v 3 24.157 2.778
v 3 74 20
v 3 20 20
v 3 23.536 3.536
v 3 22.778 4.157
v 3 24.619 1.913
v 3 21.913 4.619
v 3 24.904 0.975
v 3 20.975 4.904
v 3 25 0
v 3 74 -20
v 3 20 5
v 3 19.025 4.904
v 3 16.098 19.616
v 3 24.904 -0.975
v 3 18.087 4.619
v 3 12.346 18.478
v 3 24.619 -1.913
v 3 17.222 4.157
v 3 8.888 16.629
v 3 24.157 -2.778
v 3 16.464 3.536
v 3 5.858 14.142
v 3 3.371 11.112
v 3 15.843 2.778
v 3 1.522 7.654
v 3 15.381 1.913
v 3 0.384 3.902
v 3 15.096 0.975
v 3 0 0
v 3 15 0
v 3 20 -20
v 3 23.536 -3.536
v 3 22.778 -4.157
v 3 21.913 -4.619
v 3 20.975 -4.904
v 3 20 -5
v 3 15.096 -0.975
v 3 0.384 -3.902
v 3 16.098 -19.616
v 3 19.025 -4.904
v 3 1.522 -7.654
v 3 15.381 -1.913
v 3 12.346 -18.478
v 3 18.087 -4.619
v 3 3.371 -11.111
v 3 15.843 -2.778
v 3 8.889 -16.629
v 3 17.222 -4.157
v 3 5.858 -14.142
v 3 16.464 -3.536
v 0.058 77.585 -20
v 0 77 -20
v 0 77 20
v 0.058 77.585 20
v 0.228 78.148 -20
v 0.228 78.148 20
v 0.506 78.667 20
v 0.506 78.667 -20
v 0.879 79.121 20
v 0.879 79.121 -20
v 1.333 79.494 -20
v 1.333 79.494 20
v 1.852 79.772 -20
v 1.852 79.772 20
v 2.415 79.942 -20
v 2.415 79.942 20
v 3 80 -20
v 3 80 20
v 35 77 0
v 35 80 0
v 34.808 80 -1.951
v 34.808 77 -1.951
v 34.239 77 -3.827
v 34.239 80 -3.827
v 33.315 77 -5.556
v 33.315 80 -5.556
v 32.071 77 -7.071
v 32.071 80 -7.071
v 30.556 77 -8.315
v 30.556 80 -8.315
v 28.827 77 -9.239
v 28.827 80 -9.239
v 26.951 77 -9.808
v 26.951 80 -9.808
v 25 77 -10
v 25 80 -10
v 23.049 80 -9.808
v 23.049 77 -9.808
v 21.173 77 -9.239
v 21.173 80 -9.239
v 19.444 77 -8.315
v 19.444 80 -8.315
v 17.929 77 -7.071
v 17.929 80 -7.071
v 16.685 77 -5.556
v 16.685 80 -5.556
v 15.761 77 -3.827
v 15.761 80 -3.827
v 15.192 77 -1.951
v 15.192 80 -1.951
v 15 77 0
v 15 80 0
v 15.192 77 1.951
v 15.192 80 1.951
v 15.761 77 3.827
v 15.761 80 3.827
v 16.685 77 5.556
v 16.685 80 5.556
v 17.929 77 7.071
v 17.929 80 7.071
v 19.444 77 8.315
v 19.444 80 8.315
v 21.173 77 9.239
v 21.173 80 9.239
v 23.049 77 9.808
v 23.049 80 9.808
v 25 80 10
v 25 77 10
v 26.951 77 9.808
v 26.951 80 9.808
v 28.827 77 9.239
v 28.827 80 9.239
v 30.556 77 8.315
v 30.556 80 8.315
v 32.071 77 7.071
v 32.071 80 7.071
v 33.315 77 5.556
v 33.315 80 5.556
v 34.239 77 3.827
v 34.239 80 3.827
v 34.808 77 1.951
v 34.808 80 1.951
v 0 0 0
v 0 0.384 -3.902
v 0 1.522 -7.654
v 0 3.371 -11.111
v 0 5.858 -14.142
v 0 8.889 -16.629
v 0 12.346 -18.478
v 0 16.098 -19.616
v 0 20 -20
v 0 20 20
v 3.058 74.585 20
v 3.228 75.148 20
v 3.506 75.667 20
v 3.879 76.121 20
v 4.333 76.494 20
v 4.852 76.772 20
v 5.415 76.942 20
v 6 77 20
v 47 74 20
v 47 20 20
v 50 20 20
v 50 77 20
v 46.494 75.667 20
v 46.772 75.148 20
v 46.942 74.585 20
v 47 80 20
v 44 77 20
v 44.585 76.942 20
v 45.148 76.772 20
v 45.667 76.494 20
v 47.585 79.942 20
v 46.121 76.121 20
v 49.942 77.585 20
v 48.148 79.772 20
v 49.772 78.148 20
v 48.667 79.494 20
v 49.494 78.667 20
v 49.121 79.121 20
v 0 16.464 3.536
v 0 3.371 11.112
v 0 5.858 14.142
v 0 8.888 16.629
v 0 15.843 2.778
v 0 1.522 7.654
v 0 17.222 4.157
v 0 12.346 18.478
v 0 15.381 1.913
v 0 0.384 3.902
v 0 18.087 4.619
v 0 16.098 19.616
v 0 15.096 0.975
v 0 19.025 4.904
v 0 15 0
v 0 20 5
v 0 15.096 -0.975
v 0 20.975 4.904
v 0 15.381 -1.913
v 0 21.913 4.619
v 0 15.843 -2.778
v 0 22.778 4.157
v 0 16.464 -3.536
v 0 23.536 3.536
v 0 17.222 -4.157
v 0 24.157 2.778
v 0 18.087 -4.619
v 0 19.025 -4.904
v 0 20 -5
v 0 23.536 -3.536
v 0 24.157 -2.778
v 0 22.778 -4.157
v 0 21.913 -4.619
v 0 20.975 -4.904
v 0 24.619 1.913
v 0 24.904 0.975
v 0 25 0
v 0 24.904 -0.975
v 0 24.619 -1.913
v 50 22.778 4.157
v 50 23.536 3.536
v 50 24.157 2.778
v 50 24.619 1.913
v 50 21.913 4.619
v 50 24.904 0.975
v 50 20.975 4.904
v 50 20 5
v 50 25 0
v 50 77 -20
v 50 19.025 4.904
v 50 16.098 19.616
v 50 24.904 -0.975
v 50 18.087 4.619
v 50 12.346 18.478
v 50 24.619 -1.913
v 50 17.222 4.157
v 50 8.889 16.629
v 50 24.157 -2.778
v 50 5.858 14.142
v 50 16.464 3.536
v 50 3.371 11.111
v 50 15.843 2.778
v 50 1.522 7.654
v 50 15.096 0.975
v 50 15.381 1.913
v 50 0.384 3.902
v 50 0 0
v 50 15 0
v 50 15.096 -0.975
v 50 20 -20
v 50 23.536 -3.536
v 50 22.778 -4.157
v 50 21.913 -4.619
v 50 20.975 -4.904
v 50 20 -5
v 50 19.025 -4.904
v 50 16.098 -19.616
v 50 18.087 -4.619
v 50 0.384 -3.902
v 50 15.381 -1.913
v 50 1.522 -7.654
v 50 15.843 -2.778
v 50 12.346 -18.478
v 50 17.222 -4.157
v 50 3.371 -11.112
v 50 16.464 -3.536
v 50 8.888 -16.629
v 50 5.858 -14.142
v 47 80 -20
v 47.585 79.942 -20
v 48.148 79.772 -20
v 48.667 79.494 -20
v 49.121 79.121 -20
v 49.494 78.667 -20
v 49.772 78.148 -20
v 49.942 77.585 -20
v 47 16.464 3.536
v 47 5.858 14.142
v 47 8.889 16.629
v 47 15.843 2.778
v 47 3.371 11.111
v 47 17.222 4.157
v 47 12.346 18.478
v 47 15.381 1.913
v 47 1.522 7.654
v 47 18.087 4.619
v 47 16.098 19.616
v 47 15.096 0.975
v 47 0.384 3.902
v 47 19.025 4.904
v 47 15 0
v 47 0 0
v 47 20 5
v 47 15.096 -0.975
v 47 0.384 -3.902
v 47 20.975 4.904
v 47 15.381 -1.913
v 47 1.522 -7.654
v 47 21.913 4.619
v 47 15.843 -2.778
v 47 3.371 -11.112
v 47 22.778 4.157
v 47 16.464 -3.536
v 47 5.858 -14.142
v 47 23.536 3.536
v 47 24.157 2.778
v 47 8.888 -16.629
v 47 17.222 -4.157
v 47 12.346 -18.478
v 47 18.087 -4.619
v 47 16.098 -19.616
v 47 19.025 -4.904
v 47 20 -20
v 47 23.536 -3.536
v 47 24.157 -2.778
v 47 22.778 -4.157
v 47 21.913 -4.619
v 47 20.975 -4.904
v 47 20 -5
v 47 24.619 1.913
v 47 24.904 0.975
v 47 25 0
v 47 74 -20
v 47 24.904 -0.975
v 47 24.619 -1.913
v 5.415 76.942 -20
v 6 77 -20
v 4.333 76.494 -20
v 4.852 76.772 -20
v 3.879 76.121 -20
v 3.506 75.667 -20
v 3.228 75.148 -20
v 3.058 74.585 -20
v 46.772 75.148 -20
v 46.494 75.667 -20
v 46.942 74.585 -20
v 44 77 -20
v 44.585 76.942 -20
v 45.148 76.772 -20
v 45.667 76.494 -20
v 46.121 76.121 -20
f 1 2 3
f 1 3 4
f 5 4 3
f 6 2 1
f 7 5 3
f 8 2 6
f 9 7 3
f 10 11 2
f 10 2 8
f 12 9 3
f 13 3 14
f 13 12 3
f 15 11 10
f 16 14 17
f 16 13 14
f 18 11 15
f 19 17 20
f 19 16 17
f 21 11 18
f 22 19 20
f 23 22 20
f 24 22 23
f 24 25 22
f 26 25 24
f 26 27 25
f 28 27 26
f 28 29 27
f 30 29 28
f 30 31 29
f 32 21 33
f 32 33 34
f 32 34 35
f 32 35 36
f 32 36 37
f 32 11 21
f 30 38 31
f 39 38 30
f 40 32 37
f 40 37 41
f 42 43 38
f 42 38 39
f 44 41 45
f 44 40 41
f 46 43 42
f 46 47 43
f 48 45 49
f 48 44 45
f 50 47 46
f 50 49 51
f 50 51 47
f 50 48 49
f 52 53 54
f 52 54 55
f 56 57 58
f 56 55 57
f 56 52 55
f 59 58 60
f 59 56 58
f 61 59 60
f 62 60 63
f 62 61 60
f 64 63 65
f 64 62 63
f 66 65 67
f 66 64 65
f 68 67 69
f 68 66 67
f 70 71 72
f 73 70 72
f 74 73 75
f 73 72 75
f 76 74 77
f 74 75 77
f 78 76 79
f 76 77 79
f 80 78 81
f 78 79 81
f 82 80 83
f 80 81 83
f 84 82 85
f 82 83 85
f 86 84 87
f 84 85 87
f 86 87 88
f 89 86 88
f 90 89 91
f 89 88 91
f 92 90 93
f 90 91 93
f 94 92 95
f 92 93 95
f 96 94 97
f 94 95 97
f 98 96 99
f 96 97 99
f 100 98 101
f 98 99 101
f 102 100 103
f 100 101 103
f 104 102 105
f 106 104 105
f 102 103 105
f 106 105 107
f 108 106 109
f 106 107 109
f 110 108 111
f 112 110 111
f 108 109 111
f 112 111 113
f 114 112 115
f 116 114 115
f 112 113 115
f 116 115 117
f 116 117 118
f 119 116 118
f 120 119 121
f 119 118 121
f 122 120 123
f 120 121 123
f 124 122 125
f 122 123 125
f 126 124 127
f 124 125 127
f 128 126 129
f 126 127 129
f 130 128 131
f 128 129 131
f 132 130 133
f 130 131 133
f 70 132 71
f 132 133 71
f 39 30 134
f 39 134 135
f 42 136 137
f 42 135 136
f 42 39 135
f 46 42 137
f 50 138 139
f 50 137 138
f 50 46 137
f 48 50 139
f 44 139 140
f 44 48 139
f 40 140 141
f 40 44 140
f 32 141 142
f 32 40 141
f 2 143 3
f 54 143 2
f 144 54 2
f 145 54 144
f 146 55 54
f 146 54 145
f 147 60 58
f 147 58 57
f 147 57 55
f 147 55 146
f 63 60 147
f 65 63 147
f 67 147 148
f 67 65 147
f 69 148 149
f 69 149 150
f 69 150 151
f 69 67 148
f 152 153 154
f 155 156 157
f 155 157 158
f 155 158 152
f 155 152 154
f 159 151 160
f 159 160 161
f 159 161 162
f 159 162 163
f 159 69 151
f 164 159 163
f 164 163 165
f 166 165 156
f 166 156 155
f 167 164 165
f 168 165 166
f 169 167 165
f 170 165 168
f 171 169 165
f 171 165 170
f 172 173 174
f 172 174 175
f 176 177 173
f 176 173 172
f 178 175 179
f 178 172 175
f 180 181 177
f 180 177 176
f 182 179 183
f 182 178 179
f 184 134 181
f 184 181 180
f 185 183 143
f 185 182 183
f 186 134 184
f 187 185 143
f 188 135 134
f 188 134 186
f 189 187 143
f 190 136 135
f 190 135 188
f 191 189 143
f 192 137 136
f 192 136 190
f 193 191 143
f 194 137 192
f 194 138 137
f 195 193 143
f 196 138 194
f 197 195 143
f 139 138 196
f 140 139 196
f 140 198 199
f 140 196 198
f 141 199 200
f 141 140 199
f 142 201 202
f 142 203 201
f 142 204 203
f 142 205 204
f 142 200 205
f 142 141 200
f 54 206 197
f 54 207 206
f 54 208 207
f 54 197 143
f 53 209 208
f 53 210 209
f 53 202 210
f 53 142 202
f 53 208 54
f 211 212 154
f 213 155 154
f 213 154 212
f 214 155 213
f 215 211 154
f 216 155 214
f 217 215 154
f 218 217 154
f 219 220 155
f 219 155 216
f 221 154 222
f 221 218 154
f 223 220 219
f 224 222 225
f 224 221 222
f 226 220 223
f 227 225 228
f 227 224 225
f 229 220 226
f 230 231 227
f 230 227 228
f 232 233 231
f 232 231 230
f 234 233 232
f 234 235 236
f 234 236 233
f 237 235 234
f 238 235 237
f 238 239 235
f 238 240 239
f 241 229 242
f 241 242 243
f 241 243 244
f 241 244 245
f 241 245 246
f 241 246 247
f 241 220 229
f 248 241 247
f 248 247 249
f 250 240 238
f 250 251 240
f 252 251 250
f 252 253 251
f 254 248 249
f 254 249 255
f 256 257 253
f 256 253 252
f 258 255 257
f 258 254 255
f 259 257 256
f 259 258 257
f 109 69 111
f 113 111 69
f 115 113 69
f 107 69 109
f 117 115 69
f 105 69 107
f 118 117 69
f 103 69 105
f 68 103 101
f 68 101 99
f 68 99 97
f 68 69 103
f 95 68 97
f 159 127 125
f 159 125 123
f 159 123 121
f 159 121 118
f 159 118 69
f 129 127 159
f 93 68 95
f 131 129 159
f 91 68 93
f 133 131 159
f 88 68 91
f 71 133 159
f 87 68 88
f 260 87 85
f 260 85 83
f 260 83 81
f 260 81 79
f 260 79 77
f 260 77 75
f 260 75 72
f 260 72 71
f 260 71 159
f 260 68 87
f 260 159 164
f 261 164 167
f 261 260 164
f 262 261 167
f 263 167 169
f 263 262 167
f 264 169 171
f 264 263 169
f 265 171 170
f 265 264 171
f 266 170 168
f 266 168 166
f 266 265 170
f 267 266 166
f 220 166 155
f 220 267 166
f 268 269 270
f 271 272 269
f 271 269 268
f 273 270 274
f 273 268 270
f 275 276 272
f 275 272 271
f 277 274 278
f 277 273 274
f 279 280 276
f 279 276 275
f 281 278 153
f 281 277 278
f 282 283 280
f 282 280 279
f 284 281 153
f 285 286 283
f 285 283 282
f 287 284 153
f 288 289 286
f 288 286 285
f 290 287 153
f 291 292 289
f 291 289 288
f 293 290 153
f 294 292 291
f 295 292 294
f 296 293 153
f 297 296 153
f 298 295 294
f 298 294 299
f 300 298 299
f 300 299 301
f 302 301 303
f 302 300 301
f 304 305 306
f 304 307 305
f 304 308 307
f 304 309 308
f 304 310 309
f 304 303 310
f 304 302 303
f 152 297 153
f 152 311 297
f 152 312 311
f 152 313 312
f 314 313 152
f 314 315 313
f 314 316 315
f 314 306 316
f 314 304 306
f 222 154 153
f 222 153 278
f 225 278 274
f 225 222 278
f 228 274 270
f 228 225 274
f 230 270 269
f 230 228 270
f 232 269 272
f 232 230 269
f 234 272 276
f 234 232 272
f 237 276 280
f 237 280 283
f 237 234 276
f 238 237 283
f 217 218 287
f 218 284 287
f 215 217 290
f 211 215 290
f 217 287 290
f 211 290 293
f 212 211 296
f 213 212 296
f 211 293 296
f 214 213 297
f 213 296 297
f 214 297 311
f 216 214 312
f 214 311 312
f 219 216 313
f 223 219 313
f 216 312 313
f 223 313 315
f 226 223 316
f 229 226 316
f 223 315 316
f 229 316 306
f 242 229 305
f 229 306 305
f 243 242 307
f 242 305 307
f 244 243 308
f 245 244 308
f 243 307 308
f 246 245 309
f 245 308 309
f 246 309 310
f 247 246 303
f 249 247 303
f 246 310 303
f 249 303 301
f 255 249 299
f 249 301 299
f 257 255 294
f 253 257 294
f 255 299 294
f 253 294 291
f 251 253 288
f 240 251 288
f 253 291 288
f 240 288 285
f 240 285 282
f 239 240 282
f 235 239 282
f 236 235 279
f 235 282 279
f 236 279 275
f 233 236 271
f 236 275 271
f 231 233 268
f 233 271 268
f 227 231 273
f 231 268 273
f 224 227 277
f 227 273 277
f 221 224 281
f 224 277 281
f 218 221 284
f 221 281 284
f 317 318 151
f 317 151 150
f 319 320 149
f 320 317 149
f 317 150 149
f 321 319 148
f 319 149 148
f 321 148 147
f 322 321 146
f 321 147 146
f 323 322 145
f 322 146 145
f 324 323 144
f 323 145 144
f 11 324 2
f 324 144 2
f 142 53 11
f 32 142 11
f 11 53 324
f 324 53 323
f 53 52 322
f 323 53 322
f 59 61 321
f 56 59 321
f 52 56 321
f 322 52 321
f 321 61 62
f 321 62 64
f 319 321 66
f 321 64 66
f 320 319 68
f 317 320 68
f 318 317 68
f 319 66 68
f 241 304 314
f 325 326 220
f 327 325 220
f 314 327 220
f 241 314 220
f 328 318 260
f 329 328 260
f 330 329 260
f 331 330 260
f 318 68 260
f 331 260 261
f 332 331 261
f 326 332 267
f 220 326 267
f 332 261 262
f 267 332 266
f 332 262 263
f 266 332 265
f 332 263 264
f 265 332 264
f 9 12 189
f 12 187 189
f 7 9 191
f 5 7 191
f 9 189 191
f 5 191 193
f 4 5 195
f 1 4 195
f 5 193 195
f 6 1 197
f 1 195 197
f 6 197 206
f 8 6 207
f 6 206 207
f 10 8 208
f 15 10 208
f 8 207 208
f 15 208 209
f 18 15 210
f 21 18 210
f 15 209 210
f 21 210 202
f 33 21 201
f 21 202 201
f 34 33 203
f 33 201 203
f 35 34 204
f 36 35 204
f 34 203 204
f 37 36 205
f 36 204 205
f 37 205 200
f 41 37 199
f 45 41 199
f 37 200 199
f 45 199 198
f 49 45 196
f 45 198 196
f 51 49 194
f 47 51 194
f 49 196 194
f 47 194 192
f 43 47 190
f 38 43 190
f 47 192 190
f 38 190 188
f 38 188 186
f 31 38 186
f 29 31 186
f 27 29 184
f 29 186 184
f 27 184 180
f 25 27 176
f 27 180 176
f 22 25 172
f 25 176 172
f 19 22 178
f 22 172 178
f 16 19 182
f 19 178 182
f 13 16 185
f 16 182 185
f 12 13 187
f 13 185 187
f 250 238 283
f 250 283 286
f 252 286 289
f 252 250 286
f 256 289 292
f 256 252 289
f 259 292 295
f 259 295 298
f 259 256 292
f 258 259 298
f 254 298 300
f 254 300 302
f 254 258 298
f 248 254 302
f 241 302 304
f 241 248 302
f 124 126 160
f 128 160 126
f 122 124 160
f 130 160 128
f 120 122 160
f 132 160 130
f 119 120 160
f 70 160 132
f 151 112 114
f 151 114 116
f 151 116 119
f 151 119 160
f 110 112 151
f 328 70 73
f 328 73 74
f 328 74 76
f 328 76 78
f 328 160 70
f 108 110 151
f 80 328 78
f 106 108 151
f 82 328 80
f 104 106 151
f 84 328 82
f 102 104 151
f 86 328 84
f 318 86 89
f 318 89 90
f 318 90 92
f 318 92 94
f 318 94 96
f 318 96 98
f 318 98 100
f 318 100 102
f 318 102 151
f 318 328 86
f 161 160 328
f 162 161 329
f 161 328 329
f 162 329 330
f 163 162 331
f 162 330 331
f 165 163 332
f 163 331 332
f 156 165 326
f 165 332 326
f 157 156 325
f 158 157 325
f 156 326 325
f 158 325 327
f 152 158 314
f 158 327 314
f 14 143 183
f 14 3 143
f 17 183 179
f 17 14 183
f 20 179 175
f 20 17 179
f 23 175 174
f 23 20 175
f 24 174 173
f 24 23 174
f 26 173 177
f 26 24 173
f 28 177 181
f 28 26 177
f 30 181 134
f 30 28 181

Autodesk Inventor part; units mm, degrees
ref_plane "YZ Plane" through (0, 0, 0) normal (1, 0, 0) x (0, 1, 0)
ref_plane "XZ Plane" through (0, 0, 0) normal (0, 1, 0) x (-1, 0, 0)
ref_plane "XY Plane" through (0, 0, 0) normal (0, 0, 1) x (1, 0, 0)
sketch "Esboço1" plane through (0, 0, 0) normal (0, 0, 1) x (1, 0, 0)
  line L0 (0, 0) -> (0, 80)
  line L1 (0, 80) -> (50, 80)
  line L2 (50, 80) -> (50, 0)
  line L3 (47, 0) -> (47, 77)
  line L4 (47, 77) -> (3, 77)
  line L5 (3, 77) -> (3, 0)
  line L6 (0, 0) -> (3, 0)
  line L7 (47, 0) -> (50, 0)
  dimension "d0" = 80
  dimension "d1" = 3
  dimension "d2" = 3
  dimension "d3" = 50
  dimension "d4" = 3
extrude "Extrusão1" add sketch "Esboço1" along normal mid plane 40
fillet "Arredondamento1" radius 20 1 edges at (48.5, 0, 20)
fillet "Arredondamento2" radius 20 1 edges at (48.5, 0, -20)
fillet "Arredondamento3" radius 20 1 edges at (1.5, 0, -20)
fillet "Arredondamento4" radius 20 1 edges at (1.5, 0, 20)
fillet "Arredondamento5" radius 3 1 edges at (50, 80, 0)
fillet "Arredondamento6" radius 3 1 edges at (0, 80, 0)
fillet "Arredondamento7" radius 3 1 edges at (3, 77, 0)
fillet "Arredondamento8" radius 3 1 edges at (47, 77, 0)
sketch "Esboço2" plane through (0, 20, 0) normal (-1, 0, 0) x (0, 0, 1)
  circle A0 centre (0, 0) radius 5
  line L0 (20, 60) -> (-20, 60) projected
  point P0 (0, -20)
  dimension "d15" = 10
  dimension "d16" = 60
extrude "Extrusão2" cut sketch "Esboço2" against normal blind 50
sketch "Esboço3" plane through (47, 80, 20) normal (0, 1, 0) x (1, 0, 0)
  line L0 (-44, 25) -> (-44, 15) projected
  line L1 (-44, 20) -> (0, 20)
  line L2 (0, 40) -> (0, 0) projected
  circle A0 centre (-22, 20) radius 10
  point P0 (-47, 20)
  dimension "d19" = 20
extrude "Extrusão3" cut sketch "Esboço3" against normal blind 50
properties part number "suporte"
